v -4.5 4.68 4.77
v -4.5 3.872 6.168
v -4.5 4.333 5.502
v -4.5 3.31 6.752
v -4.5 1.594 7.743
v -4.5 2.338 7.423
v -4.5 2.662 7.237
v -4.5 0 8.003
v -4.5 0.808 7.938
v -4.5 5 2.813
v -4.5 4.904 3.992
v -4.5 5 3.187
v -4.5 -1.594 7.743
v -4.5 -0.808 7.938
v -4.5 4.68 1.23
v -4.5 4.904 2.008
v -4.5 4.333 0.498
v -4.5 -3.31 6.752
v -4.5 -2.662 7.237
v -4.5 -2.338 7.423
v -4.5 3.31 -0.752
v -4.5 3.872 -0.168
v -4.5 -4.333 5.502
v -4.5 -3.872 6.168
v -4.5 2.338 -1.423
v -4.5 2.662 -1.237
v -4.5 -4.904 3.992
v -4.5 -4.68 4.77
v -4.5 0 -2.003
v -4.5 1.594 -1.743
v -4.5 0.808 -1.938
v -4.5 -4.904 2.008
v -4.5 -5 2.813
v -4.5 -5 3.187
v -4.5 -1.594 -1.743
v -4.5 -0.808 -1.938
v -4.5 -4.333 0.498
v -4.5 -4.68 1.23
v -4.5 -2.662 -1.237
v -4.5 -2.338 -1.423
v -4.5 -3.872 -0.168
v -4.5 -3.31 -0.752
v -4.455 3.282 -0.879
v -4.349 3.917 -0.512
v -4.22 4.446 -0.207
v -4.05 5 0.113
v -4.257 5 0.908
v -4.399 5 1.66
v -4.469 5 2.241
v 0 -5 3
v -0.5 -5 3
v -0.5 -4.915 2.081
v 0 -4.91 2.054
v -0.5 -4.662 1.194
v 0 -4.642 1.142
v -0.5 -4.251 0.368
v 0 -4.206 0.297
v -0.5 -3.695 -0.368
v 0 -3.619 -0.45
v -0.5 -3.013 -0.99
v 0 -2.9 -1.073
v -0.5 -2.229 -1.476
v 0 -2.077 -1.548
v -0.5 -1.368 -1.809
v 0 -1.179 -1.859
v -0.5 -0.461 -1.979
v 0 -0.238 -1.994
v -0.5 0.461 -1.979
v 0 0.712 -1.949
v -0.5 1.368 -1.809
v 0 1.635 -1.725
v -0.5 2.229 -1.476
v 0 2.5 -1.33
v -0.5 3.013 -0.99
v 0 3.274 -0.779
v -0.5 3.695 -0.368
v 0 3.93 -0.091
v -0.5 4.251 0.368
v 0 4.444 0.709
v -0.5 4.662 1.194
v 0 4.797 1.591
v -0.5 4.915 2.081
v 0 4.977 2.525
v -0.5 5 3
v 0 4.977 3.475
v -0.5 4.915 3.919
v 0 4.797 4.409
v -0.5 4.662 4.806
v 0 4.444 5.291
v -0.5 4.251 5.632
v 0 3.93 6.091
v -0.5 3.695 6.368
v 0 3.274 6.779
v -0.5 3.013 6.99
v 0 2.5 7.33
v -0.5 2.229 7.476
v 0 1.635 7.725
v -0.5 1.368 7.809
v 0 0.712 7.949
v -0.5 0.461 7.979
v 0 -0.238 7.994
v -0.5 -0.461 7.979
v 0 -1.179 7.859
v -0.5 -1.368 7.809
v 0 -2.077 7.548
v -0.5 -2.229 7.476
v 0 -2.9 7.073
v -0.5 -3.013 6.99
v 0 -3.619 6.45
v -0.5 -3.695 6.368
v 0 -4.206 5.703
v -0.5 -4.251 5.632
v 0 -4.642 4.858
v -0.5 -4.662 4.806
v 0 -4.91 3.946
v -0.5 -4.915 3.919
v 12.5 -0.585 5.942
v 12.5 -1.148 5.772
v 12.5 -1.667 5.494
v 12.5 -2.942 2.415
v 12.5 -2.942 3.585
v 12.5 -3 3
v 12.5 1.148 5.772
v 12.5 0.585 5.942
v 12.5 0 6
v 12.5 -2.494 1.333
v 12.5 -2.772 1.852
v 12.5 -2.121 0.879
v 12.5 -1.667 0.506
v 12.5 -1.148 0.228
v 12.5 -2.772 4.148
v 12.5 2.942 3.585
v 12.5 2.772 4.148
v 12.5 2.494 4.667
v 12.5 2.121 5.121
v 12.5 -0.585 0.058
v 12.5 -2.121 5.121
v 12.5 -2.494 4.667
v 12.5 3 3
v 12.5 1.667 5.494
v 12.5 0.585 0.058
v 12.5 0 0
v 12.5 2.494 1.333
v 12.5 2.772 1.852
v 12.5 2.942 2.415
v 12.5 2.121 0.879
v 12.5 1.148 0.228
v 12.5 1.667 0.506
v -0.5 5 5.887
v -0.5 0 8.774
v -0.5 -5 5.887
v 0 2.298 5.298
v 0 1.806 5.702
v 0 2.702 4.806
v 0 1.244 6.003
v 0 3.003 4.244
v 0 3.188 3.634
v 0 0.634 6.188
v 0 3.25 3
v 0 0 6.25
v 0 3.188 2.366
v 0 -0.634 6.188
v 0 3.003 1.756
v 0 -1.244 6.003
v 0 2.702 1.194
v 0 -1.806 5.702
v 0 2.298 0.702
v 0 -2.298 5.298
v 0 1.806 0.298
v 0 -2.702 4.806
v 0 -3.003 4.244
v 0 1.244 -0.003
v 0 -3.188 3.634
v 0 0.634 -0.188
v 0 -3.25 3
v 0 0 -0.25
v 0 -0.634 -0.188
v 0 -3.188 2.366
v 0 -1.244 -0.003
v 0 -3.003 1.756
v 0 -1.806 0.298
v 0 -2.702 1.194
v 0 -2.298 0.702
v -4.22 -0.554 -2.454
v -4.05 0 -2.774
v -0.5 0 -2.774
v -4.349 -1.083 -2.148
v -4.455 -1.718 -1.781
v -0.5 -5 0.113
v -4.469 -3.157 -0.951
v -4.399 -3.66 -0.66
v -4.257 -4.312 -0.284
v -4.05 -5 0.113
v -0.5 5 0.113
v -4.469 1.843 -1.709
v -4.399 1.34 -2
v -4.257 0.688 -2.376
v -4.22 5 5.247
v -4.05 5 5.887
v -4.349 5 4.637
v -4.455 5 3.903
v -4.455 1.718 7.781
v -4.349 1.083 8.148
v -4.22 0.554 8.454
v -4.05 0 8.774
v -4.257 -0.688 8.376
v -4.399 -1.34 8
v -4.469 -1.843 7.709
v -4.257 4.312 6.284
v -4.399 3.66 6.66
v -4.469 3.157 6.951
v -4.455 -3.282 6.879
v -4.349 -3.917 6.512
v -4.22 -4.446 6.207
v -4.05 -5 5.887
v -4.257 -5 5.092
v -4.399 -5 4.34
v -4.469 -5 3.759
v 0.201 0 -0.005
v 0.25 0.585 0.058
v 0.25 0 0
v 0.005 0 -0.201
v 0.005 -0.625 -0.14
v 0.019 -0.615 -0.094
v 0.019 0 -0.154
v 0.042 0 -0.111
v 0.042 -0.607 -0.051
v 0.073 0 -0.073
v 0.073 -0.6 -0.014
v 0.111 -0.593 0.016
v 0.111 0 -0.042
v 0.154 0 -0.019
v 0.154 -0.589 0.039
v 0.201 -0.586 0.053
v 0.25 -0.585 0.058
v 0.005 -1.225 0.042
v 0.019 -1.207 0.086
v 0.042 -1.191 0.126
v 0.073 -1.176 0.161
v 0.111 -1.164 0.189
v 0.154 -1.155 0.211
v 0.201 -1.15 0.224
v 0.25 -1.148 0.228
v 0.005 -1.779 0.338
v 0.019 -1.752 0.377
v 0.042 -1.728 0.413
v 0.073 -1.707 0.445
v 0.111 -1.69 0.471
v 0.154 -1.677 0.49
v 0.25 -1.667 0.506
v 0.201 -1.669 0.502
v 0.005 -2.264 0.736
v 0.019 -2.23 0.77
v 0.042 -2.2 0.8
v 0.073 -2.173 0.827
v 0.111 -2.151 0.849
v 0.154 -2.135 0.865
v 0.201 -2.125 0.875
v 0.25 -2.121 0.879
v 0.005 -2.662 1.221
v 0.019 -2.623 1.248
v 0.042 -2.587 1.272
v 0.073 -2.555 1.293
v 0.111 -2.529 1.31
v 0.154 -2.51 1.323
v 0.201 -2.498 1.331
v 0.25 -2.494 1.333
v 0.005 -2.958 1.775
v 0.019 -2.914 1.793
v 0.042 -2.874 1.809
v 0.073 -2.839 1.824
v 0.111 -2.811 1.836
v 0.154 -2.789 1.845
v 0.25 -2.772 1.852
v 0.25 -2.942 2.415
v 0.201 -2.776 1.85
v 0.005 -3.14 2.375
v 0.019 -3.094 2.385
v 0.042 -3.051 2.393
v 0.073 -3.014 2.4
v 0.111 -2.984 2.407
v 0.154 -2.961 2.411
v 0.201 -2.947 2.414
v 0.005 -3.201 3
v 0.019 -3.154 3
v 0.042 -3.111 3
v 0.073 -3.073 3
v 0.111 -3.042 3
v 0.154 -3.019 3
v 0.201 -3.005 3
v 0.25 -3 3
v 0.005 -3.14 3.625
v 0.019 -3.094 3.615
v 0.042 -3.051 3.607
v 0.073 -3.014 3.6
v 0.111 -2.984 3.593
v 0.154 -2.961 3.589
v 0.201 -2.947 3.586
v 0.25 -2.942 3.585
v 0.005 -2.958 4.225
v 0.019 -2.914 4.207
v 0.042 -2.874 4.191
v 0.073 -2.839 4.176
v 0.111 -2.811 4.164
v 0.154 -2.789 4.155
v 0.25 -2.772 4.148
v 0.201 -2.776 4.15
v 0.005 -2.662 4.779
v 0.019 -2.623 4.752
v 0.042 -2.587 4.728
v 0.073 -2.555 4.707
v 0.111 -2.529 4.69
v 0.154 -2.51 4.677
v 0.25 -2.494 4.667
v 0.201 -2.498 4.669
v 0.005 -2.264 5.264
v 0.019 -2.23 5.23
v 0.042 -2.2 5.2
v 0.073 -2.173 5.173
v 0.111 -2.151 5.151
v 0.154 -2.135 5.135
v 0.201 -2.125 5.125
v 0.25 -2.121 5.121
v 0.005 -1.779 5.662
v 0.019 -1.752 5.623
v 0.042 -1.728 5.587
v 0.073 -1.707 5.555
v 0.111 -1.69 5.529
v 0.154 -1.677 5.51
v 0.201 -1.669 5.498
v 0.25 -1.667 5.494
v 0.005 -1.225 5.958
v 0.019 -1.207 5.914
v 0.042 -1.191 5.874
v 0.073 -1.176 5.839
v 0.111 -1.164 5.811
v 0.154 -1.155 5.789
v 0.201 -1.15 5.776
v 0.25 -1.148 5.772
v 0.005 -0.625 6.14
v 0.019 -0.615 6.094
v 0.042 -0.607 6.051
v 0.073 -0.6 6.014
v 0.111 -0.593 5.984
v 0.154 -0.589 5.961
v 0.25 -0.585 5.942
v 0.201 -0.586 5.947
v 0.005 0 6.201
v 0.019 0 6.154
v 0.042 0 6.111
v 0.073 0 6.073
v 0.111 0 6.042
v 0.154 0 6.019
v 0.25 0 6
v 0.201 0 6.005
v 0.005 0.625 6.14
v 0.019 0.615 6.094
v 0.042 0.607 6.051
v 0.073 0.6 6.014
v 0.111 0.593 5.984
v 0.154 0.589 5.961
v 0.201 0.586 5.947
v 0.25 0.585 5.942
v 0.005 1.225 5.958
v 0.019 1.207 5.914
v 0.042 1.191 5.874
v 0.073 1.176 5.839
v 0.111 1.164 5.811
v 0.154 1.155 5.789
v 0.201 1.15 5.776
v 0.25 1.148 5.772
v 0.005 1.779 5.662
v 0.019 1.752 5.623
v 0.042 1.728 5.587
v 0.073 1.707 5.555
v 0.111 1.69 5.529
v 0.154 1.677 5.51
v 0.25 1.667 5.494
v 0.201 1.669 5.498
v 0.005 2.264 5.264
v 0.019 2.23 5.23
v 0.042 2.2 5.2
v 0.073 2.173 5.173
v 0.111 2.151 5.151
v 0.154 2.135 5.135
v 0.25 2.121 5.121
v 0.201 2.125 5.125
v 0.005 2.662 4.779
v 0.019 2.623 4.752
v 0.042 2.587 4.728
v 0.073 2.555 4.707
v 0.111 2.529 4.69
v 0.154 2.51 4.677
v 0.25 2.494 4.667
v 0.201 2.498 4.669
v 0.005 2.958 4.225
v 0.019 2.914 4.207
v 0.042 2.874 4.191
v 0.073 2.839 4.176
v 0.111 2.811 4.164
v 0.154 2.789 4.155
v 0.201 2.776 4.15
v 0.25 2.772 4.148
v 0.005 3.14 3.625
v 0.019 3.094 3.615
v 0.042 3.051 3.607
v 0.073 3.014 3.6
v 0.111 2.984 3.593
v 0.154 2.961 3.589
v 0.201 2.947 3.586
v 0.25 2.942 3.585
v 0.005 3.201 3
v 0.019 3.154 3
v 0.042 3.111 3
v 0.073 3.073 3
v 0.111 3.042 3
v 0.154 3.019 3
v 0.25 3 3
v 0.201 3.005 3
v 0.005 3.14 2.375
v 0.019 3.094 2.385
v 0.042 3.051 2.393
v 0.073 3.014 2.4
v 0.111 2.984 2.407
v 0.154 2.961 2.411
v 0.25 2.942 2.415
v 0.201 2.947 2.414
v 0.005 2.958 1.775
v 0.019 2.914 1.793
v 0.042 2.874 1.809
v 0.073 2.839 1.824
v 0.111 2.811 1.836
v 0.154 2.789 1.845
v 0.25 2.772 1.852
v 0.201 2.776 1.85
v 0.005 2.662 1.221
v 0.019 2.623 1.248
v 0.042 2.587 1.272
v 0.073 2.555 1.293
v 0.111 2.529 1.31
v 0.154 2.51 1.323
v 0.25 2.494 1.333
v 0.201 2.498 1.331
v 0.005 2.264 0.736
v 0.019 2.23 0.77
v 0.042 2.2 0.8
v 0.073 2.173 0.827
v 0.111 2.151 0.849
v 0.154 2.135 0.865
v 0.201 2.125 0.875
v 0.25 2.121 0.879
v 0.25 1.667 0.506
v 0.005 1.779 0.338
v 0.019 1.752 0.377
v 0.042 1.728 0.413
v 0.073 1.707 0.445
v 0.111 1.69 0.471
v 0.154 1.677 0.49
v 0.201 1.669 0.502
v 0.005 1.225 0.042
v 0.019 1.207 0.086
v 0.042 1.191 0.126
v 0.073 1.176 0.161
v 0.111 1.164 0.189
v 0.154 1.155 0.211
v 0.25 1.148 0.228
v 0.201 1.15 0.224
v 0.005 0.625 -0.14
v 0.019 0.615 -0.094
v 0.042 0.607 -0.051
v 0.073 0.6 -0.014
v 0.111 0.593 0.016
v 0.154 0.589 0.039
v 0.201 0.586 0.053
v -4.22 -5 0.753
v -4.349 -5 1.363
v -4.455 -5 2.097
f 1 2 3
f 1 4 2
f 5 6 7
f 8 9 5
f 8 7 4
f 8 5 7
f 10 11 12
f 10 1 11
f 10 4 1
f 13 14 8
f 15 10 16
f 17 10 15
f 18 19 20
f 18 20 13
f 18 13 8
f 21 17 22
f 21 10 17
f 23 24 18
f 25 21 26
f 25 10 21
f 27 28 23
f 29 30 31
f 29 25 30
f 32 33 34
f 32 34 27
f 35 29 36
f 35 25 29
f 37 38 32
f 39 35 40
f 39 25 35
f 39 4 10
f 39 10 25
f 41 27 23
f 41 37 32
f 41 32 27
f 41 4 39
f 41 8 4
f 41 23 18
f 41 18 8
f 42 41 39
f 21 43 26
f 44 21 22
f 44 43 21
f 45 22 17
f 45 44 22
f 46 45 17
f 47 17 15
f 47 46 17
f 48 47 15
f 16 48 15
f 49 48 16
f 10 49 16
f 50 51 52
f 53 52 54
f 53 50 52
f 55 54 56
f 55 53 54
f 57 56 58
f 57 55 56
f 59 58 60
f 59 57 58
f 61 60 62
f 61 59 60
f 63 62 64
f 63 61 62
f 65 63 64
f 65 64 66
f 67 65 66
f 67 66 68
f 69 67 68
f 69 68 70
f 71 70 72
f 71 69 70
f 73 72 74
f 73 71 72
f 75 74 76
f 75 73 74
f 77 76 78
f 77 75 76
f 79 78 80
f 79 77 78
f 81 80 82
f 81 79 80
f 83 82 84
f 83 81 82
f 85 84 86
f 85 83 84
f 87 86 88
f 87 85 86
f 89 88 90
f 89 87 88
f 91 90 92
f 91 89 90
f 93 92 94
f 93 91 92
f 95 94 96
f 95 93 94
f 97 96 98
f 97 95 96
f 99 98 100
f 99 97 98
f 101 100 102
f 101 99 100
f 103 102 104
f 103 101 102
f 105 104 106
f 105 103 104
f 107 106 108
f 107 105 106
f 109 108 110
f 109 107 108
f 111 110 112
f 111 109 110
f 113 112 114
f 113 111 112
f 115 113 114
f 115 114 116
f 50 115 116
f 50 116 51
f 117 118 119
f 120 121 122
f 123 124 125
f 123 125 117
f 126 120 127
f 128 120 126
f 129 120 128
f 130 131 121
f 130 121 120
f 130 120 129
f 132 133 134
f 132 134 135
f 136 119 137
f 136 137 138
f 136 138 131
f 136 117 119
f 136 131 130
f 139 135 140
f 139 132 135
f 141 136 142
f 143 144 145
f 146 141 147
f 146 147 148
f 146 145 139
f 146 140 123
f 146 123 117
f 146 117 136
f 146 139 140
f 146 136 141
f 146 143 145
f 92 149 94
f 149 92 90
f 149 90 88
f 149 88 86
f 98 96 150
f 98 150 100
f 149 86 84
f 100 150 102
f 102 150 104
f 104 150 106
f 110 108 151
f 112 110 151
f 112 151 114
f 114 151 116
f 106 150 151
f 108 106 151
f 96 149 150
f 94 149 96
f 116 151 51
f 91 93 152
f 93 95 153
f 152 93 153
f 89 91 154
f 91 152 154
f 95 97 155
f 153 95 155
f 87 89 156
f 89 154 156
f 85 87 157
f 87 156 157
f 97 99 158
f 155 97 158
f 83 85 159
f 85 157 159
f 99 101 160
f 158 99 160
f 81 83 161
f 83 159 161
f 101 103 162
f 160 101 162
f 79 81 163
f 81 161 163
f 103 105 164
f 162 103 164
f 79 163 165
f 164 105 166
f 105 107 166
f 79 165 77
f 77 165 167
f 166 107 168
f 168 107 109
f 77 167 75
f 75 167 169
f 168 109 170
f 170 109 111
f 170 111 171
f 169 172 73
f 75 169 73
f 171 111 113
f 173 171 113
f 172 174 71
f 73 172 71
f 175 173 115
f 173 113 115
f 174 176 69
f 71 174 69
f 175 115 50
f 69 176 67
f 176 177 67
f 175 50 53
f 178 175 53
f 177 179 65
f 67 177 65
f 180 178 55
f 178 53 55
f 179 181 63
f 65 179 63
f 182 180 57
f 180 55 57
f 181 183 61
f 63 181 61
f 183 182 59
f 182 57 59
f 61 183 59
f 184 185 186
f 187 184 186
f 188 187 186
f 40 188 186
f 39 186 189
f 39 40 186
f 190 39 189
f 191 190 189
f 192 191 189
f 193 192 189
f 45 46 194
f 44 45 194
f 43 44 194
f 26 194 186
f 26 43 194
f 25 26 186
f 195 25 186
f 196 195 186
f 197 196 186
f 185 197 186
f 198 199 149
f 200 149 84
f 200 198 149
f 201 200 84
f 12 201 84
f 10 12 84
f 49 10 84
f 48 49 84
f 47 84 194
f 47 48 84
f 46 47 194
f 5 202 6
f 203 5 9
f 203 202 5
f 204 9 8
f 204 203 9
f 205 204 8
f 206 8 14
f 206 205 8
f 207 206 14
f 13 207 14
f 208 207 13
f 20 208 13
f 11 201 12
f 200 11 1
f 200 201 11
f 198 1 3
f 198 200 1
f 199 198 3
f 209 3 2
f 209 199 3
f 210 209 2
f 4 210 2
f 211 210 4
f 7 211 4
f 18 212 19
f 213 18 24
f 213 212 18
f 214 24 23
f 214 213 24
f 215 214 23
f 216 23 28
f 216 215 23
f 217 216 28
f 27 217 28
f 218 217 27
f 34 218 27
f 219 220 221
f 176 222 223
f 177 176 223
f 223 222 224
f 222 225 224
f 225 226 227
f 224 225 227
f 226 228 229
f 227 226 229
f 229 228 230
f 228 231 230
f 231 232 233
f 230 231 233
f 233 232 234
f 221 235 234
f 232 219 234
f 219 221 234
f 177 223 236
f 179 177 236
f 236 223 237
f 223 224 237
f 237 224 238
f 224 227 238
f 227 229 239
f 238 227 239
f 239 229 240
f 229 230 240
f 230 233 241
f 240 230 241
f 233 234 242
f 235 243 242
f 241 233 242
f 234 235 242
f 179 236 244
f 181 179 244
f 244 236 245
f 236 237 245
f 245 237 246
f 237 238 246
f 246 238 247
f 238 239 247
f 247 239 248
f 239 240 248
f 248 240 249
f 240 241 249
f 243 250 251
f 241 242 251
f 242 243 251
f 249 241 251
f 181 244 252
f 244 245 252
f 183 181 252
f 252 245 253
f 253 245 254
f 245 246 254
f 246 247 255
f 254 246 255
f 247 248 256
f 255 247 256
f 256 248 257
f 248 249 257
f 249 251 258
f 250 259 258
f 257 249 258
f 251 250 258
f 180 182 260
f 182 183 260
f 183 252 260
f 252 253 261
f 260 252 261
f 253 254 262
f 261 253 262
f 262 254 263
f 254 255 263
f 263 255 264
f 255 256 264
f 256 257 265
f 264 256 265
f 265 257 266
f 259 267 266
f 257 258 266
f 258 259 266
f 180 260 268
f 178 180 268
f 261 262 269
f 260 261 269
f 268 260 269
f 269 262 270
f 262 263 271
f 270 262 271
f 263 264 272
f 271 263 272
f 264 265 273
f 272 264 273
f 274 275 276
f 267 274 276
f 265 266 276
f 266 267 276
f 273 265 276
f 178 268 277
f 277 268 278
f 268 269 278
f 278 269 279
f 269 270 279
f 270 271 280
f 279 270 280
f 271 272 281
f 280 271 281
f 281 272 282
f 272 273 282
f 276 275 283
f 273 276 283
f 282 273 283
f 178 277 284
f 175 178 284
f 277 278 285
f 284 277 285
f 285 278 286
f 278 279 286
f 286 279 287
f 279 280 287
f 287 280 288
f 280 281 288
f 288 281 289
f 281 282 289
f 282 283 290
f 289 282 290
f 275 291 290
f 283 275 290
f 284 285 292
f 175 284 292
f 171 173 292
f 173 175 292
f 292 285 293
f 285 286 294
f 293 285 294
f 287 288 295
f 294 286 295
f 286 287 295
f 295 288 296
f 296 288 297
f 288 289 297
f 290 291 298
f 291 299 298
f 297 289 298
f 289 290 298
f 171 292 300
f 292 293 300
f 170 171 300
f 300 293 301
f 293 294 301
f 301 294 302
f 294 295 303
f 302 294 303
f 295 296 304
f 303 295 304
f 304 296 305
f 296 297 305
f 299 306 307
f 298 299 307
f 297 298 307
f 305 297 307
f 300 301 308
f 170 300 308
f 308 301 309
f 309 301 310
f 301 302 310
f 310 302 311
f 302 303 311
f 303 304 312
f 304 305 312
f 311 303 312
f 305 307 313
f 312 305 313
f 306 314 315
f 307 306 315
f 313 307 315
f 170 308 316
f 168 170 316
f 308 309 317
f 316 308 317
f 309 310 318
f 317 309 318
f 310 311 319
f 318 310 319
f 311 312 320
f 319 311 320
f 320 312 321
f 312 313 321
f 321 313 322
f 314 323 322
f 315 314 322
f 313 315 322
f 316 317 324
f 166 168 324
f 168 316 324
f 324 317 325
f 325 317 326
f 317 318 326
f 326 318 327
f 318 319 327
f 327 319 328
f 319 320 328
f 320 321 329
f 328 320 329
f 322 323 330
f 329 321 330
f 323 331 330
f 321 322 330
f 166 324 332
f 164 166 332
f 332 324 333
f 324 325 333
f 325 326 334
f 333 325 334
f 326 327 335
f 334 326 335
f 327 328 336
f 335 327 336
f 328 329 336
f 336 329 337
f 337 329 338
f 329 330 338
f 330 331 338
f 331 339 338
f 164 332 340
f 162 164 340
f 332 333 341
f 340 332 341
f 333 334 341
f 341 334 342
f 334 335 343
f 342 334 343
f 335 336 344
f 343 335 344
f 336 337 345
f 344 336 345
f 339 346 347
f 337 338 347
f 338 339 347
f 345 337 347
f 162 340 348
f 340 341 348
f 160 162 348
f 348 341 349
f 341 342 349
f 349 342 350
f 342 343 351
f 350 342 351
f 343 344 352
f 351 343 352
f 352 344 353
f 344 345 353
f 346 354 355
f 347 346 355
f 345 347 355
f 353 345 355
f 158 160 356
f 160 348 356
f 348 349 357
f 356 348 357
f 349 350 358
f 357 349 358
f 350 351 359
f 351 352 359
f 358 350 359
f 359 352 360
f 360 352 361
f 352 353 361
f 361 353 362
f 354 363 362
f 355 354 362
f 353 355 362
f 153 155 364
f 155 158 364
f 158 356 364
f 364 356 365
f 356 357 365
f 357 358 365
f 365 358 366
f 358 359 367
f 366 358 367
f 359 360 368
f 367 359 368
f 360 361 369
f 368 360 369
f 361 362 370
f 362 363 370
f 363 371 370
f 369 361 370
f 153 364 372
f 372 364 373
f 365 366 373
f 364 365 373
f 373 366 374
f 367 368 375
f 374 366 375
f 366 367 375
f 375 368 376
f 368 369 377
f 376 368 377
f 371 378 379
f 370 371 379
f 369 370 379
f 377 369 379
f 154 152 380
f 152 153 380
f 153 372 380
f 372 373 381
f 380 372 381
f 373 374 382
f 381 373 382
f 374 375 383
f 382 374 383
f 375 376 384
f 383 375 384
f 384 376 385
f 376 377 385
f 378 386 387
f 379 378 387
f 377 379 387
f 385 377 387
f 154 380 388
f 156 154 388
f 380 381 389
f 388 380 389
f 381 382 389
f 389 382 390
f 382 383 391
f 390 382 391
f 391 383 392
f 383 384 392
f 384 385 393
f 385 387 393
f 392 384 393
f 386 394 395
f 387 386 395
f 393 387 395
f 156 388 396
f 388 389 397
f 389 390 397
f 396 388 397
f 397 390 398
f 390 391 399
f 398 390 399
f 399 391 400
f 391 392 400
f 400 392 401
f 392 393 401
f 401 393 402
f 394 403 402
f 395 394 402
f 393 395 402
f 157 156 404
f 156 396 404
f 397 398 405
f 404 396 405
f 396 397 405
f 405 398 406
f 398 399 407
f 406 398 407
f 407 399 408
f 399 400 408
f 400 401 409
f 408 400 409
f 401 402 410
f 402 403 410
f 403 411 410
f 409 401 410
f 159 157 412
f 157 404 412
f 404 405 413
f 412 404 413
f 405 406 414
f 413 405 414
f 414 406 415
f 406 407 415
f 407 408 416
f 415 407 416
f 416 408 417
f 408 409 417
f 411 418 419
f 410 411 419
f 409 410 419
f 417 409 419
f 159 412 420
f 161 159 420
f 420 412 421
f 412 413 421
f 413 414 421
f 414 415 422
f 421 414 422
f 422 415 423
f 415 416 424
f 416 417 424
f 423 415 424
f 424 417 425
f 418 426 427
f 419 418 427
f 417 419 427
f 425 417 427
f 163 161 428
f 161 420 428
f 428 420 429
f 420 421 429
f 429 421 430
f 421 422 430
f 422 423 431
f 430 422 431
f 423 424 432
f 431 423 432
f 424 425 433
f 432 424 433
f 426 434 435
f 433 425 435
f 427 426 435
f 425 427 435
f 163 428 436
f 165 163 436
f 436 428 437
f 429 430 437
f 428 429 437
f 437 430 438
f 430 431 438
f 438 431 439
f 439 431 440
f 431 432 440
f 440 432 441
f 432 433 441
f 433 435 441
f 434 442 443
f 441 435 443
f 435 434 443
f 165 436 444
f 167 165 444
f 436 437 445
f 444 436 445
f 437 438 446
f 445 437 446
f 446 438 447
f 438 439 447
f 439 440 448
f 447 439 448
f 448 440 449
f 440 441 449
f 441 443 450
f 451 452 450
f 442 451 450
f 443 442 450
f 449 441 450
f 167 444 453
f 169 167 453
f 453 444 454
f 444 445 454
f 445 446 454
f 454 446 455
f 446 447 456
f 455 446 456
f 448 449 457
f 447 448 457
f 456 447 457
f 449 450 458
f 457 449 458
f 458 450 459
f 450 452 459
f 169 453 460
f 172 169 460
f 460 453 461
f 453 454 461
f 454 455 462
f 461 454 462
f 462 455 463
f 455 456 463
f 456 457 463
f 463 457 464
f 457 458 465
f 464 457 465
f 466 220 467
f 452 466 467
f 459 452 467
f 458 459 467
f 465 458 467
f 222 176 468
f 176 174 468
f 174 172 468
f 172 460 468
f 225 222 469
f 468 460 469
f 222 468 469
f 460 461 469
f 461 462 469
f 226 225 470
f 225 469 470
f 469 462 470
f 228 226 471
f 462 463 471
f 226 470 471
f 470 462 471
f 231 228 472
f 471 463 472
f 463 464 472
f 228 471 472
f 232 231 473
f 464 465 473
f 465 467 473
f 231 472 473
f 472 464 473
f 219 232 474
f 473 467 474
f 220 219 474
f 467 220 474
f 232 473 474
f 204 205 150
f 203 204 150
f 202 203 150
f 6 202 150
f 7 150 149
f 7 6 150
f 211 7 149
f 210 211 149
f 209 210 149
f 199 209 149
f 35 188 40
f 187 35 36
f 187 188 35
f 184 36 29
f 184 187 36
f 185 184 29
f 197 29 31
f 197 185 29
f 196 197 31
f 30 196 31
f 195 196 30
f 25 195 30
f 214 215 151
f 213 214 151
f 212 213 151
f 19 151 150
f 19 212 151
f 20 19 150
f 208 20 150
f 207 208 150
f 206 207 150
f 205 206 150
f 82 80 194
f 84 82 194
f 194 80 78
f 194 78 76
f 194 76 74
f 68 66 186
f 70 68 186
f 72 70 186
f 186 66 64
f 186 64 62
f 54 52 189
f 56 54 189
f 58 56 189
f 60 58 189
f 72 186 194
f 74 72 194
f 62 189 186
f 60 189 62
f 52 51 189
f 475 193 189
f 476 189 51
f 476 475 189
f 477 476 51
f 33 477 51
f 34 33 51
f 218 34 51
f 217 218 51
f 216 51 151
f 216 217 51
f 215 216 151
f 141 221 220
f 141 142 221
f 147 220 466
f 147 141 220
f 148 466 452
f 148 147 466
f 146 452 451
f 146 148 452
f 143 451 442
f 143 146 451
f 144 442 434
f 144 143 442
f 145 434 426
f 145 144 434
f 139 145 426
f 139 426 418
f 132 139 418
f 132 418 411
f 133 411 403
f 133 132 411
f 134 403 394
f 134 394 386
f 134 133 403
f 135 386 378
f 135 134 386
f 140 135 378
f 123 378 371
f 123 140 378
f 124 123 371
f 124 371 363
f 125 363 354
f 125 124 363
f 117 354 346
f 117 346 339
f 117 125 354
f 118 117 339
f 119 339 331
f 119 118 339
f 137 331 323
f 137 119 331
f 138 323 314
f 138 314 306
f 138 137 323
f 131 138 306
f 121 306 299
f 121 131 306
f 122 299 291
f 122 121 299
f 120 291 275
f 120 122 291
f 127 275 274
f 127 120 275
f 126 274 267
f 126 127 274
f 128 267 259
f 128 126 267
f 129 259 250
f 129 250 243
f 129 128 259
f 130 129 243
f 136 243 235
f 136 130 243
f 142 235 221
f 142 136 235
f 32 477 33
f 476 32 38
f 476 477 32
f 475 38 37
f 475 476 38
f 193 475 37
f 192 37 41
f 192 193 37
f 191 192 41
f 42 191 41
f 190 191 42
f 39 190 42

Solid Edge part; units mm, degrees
sketch "Sketch1" plane through (0, 0, 0) normal (0, -1, 0) x (1, 0, 0)
  line L0 (12.5, 0) -> (12.5, 3)
  line L1 (0, 3) -> (12.5, 3)
  line L2 (0, 3) -> (0, 0)
  line L3 (0, 0) -> (12.5, 0)
revolve "RevolvedProtrusion1" add sketch "Sketch1" angle 360 about axis through (0, 0, 3) along (1, 0, 0)
sketch "Sketch2" plane through (0, 0, 3) normal (-1, 0, 0) x (0, -1, 0)
  circle A0 centre (0, 0) radius 5
extrude "Protrusion1" add sketch "Sketch2" along normal blind 0.5
sketch "Sketch3" plane through (-0.5, 0, 3) normal (-1, 0, 0) x (0, -1, 0)
  circle A0 centre (0, 0) radius 5
extrude "Protrusão_Extrudada_5" add sketch "Sketch3" along normal blind 4
sketch "Sketch4" plane through (-4.5, 0, 3) normal (-1, 0, 0) x (0, -1, 0)
  line L0 (-5, 2.8868) -> (-5, -2.8868)
  line L1 (-5, -2.8868) -> (0, -5.7735)
  line L2 (0, -5.7735) -> (5, -2.8868)
  line L3 (5, -2.8868) -> (5, 2.8868)
  line L4 (5, 2.8868) -> (0, 5.7735)
  line L5 (0, 5.7735) -> (-5, 2.8868)
extrude "Protrusão_Extrudada_8" add sketch "Sketch4" against normal blind 4
fillet "Redondo_2" radius 0.25 1 edges at (0, 0, 6)
sketch "Sketch5" plane through (0, 0, 0) normal (0, 1, 0) x (-1, 0, 0)
  line L0 (4.5, 8.7735) -> (4.05, 8.7735)
  line L1 (4.5, 8.0035) -> (4.05, 8.7735)
  line L2 (4.5, 8.7735) -> (4.5, 8.0035)
revolve "RevolvedCutout1" cut sketch "Sketch5" angle 360 about axis through (-4.5, 0, 3) along (1, 0, 0)
properties material "Polypropylene, high impact"
